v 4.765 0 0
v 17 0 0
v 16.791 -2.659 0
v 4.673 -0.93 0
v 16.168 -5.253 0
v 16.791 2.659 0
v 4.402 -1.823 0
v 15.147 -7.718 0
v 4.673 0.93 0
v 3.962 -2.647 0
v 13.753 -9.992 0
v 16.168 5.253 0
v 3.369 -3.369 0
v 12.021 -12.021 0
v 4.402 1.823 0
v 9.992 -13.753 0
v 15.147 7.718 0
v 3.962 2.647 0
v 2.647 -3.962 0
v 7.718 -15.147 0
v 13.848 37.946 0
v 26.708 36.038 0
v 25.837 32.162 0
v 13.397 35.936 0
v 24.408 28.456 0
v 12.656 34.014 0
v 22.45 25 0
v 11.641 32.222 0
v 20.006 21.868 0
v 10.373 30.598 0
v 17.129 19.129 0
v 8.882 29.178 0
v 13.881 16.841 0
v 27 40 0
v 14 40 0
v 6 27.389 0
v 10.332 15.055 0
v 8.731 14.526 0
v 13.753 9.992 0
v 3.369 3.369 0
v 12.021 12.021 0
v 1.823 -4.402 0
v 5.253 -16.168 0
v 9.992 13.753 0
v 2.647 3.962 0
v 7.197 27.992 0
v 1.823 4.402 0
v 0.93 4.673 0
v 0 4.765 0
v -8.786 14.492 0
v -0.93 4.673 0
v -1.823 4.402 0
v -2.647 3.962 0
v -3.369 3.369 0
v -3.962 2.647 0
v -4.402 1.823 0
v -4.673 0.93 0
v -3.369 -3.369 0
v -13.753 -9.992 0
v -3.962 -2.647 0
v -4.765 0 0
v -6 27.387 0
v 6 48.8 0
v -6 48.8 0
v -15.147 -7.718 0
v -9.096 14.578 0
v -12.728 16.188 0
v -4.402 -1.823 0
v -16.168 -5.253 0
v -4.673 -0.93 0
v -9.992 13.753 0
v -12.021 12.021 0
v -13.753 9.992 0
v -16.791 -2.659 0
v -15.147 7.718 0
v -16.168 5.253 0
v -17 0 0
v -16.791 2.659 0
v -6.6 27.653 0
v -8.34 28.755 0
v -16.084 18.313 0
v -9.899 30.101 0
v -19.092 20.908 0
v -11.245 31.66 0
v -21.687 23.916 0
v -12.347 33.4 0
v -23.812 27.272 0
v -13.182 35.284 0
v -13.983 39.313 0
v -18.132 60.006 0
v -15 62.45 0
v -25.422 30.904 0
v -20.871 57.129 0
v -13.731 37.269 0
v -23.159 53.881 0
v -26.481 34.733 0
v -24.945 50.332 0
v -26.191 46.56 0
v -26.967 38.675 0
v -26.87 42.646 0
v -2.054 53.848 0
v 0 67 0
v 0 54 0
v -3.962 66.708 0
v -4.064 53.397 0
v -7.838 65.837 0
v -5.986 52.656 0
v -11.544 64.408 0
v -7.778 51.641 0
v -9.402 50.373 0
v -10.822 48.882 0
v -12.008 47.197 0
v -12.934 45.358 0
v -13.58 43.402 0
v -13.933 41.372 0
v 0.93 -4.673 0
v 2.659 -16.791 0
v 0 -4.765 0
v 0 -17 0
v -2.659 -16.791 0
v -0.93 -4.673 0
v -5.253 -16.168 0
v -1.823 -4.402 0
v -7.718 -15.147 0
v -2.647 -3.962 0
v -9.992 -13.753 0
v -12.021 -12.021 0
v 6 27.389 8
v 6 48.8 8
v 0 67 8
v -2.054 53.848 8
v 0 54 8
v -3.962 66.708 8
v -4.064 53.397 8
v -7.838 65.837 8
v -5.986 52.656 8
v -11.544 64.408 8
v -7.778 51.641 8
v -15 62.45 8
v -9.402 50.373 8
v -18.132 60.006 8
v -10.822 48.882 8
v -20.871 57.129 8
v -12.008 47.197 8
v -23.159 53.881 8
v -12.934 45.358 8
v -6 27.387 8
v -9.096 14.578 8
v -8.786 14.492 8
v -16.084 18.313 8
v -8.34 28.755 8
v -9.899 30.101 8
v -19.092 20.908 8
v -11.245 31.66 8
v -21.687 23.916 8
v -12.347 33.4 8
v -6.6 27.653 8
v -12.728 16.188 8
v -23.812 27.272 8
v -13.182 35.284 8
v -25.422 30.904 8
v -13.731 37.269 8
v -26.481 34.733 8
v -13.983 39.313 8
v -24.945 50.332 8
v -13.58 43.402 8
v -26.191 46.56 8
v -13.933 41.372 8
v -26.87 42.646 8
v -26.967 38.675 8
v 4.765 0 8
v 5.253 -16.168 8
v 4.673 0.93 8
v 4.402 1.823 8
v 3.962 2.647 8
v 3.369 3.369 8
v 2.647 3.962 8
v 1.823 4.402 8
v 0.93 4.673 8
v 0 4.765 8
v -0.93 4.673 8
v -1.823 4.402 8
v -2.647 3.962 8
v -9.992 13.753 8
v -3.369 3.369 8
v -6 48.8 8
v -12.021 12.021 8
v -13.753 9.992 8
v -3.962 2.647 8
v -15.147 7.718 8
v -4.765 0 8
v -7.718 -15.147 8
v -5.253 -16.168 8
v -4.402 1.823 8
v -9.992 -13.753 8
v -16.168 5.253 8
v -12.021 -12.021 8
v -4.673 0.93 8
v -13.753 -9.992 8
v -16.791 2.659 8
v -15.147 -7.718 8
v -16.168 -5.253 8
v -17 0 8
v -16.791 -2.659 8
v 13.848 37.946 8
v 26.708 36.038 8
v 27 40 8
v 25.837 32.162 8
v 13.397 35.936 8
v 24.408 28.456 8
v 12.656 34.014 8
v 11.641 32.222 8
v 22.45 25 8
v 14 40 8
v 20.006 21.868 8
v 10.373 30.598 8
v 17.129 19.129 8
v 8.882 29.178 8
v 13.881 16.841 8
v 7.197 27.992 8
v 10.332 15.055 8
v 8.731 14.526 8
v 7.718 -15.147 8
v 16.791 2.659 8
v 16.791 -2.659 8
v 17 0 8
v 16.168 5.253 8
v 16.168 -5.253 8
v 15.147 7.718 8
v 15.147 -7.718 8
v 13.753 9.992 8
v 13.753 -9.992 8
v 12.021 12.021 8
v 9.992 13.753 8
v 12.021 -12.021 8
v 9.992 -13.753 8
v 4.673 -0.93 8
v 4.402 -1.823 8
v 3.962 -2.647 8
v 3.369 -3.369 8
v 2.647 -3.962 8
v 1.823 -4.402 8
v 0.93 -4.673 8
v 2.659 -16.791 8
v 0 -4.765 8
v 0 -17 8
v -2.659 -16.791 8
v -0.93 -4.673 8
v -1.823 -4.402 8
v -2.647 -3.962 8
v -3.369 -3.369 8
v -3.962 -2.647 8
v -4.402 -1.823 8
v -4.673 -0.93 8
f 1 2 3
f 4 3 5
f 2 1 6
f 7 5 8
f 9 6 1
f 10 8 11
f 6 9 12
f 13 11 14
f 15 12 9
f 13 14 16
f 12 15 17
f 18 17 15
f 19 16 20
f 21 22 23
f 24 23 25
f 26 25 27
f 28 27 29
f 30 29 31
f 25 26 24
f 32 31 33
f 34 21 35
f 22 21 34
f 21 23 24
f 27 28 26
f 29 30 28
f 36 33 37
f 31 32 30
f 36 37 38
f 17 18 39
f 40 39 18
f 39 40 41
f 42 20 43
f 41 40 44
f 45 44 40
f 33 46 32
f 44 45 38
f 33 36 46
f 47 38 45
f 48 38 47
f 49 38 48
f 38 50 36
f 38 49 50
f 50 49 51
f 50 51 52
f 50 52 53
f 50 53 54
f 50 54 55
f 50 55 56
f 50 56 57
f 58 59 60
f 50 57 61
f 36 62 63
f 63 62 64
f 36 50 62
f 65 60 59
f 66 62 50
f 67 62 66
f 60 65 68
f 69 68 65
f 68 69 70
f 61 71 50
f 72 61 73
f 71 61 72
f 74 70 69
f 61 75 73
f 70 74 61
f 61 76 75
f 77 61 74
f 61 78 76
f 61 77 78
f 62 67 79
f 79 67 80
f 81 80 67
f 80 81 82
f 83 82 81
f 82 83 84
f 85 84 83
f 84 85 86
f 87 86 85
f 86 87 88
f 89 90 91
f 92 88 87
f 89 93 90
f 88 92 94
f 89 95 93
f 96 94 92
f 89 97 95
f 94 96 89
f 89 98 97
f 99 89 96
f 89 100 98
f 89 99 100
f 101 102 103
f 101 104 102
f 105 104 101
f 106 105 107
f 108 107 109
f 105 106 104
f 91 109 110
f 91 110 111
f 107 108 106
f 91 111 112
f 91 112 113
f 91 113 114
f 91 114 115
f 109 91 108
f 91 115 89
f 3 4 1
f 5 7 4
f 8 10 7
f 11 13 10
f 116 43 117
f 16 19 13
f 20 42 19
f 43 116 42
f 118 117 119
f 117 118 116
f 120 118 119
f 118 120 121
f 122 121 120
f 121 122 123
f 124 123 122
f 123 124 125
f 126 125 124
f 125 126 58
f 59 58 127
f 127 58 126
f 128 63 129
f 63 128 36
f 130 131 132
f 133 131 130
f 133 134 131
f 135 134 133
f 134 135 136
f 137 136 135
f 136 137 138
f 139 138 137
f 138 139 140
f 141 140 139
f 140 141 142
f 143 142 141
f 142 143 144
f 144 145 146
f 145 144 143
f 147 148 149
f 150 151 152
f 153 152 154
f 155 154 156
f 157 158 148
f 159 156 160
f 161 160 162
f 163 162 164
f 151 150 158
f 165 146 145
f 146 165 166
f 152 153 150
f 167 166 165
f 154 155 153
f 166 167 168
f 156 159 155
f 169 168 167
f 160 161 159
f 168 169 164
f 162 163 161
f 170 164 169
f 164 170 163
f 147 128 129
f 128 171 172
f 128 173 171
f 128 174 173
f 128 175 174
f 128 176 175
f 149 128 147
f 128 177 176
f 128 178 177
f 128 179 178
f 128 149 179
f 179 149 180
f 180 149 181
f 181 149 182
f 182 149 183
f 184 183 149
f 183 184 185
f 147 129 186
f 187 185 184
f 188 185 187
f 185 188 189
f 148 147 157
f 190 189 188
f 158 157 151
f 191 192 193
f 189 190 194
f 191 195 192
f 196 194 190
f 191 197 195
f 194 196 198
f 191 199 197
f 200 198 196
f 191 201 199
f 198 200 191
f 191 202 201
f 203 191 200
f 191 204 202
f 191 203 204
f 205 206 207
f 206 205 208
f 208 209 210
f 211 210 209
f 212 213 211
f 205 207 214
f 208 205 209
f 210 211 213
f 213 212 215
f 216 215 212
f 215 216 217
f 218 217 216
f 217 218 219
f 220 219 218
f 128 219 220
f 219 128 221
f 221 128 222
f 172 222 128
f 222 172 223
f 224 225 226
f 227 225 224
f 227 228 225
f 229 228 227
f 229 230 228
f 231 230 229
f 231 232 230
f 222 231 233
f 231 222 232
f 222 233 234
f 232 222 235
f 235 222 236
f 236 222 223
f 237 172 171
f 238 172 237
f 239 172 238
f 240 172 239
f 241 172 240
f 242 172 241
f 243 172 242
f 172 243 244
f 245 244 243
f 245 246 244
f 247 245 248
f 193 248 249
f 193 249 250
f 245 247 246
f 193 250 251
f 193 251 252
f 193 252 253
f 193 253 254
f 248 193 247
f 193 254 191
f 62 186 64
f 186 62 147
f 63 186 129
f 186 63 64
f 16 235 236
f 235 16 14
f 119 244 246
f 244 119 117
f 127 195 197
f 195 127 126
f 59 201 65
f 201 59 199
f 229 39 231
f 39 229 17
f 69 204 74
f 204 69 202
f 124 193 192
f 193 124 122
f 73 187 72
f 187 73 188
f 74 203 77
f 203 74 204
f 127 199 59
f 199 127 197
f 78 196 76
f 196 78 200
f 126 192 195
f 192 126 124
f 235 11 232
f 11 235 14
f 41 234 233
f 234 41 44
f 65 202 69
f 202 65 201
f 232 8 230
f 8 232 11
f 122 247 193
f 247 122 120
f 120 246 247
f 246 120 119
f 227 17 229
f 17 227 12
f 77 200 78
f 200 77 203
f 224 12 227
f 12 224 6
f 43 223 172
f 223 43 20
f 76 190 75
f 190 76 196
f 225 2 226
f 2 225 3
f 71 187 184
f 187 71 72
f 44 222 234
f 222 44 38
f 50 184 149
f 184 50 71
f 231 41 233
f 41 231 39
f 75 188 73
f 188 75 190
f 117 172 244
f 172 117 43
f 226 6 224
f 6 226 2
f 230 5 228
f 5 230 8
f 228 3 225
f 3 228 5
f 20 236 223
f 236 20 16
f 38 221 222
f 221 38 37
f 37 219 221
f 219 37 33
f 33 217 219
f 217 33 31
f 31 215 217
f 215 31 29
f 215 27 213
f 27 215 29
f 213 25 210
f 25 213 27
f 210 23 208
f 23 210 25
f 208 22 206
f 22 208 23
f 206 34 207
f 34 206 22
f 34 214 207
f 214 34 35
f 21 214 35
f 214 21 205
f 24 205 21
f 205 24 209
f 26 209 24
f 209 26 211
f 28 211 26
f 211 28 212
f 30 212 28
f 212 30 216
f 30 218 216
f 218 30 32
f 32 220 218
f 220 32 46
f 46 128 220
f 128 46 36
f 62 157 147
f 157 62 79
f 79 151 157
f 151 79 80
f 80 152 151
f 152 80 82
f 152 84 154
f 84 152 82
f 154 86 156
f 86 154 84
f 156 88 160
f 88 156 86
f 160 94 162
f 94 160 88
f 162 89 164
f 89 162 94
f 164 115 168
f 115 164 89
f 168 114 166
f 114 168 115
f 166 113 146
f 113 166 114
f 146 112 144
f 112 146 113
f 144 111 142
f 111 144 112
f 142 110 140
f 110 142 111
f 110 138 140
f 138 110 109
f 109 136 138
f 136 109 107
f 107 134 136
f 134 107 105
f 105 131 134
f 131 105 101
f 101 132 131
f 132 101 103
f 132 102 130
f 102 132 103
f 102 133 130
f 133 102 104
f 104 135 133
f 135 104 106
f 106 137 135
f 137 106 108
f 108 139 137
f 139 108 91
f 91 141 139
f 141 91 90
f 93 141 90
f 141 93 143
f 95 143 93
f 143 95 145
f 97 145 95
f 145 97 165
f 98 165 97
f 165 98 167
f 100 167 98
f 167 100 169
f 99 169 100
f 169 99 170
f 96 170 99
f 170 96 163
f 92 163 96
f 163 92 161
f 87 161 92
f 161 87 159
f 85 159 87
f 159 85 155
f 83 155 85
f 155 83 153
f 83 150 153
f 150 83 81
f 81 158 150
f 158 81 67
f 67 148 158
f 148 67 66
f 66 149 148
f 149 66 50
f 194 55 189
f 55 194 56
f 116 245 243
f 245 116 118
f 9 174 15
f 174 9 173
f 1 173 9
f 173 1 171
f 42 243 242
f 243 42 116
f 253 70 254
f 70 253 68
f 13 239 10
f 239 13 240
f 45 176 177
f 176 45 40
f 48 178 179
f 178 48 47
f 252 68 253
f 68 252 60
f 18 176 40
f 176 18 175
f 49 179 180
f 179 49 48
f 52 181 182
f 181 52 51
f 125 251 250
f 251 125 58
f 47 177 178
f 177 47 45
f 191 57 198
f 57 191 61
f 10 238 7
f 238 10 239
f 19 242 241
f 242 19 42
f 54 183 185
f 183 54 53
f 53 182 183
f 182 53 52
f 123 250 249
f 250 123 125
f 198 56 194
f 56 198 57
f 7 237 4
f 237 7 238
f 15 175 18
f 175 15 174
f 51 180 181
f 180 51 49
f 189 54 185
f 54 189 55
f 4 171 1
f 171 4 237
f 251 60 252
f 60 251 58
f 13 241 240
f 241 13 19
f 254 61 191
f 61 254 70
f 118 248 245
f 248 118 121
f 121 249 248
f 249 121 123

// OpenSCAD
$fn = 32;

// ----------------------------------------------------------------------
// Hook: 80 mm shank into a 14 mm curl, 8 mm thick
// ----------------------------------------------------------------------

// --- parameters (mm) ---
shank_len = 80;           // shank length from the boss centre
shank_w = 12;             // shank width
boss_d = 34;              // boss diameter
bore_d = 9.53;            // boss bore
curl_in = 14;             // curl inner radius
curl_out = 27;            // curl outer radius
curl_sweep = 270;         // curl sweep angle
hook_t = 8;               // hook thickness

shank_profile = [[-6, 48.8], [6, 48.8], [6, 15], [-6, 15]];
boss_profile = [[17, 0], [16.791, 2.659], [16.168, 5.253], [15.147, 7.718], [13.753, 9.992], [12.021, 12.021], [9.992, 13.753], [7.718, 15.147], [5.253, 16.168], [2.659, 16.791], [0, 17], [-2.659, 16.791], [-5.253, 16.168], [-7.718, 15.147], [-9.992, 13.753], [-12.021, 12.021], [-13.753, 9.992], [-15.147, 7.718], [-16.168, 5.253], [-16.791, 2.659], [-17, 0], [-16.791, -2.659], [-16.168, -5.253], [-15.147, -7.718], [-13.753, -9.992], [-12.021, -12.021], [-9.992, -13.753], [-7.718, -15.147], [-5.253, -16.168], [-2.659, -16.791], [0, -17], [2.659, -16.791], [5.253, -16.168], [7.718, -15.147], [9.992, -13.753], [12.021, -12.021], [13.753, -9.992], [15.147, -7.718], [16.168, -5.253], [16.791, -2.659]];
curl_profile = [[0, 67], [-3.962, 66.708], [-7.838, 65.837], [-11.544, 64.408], [-15, 62.45], [-18.132, 60.006], [-20.871, 57.129], [-23.159, 53.881], [-24.945, 50.332], [-26.191, 46.56], [-26.87, 42.646], [-26.967, 38.675], [-26.481, 34.733], [-25.422, 30.904], [-23.812, 27.272], [-21.687, 23.916], [-19.092, 20.908], [-16.084, 18.313], [-12.728, 16.188], [-9.096, 14.578], [-5.267, 13.519], [-1.325, 13.033], [2.646, 13.13], [6.56, 13.809], [10.332, 15.055], [13.881, 16.841], [17.129, 19.129], [20.006, 21.868], [22.45, 25], [24.408, 28.456], [25.837, 32.162], [26.708, 36.038], [27, 40], [14, 40], [13.848, 37.946], [13.397, 35.936], [12.656, 34.014], [11.641, 32.222], [10.373, 30.598], [8.882, 29.178], [7.197, 27.992], [5.358, 27.066], [3.402, 26.42], [1.372, 26.067], [-0.687, 26.017], [-2.731, 26.269], [-4.716, 26.818], [-6.6, 27.653], [-8.34, 28.755], [-9.899, 30.101], [-11.245, 31.66], [-12.347, 33.4], [-13.182, 35.284], [-13.731, 37.269], [-13.983, 39.313], [-13.933, 41.372], [-13.58, 43.402], [-12.934, 45.358], [-12.008, 47.197], [-10.822, 48.882], [-9.402, 50.373], [-7.778, 51.641], [-5.986, 52.656], [-4.064, 53.397], [-2.054, 53.848], [0, 54]];

difference() {
  union() {
    /* three overlapping outlines: shank, boss and the smooth curl */
    linear_extrude(height = hook_t) polygon(shank_profile);
    linear_extrude(height = hook_t) polygon(boss_profile);
    linear_extrude(height = hook_t) polygon(curl_profile);
  }
  translate([0, 0, -2.5]) cylinder(h = hook_t + 5, d = bore_d);
}
